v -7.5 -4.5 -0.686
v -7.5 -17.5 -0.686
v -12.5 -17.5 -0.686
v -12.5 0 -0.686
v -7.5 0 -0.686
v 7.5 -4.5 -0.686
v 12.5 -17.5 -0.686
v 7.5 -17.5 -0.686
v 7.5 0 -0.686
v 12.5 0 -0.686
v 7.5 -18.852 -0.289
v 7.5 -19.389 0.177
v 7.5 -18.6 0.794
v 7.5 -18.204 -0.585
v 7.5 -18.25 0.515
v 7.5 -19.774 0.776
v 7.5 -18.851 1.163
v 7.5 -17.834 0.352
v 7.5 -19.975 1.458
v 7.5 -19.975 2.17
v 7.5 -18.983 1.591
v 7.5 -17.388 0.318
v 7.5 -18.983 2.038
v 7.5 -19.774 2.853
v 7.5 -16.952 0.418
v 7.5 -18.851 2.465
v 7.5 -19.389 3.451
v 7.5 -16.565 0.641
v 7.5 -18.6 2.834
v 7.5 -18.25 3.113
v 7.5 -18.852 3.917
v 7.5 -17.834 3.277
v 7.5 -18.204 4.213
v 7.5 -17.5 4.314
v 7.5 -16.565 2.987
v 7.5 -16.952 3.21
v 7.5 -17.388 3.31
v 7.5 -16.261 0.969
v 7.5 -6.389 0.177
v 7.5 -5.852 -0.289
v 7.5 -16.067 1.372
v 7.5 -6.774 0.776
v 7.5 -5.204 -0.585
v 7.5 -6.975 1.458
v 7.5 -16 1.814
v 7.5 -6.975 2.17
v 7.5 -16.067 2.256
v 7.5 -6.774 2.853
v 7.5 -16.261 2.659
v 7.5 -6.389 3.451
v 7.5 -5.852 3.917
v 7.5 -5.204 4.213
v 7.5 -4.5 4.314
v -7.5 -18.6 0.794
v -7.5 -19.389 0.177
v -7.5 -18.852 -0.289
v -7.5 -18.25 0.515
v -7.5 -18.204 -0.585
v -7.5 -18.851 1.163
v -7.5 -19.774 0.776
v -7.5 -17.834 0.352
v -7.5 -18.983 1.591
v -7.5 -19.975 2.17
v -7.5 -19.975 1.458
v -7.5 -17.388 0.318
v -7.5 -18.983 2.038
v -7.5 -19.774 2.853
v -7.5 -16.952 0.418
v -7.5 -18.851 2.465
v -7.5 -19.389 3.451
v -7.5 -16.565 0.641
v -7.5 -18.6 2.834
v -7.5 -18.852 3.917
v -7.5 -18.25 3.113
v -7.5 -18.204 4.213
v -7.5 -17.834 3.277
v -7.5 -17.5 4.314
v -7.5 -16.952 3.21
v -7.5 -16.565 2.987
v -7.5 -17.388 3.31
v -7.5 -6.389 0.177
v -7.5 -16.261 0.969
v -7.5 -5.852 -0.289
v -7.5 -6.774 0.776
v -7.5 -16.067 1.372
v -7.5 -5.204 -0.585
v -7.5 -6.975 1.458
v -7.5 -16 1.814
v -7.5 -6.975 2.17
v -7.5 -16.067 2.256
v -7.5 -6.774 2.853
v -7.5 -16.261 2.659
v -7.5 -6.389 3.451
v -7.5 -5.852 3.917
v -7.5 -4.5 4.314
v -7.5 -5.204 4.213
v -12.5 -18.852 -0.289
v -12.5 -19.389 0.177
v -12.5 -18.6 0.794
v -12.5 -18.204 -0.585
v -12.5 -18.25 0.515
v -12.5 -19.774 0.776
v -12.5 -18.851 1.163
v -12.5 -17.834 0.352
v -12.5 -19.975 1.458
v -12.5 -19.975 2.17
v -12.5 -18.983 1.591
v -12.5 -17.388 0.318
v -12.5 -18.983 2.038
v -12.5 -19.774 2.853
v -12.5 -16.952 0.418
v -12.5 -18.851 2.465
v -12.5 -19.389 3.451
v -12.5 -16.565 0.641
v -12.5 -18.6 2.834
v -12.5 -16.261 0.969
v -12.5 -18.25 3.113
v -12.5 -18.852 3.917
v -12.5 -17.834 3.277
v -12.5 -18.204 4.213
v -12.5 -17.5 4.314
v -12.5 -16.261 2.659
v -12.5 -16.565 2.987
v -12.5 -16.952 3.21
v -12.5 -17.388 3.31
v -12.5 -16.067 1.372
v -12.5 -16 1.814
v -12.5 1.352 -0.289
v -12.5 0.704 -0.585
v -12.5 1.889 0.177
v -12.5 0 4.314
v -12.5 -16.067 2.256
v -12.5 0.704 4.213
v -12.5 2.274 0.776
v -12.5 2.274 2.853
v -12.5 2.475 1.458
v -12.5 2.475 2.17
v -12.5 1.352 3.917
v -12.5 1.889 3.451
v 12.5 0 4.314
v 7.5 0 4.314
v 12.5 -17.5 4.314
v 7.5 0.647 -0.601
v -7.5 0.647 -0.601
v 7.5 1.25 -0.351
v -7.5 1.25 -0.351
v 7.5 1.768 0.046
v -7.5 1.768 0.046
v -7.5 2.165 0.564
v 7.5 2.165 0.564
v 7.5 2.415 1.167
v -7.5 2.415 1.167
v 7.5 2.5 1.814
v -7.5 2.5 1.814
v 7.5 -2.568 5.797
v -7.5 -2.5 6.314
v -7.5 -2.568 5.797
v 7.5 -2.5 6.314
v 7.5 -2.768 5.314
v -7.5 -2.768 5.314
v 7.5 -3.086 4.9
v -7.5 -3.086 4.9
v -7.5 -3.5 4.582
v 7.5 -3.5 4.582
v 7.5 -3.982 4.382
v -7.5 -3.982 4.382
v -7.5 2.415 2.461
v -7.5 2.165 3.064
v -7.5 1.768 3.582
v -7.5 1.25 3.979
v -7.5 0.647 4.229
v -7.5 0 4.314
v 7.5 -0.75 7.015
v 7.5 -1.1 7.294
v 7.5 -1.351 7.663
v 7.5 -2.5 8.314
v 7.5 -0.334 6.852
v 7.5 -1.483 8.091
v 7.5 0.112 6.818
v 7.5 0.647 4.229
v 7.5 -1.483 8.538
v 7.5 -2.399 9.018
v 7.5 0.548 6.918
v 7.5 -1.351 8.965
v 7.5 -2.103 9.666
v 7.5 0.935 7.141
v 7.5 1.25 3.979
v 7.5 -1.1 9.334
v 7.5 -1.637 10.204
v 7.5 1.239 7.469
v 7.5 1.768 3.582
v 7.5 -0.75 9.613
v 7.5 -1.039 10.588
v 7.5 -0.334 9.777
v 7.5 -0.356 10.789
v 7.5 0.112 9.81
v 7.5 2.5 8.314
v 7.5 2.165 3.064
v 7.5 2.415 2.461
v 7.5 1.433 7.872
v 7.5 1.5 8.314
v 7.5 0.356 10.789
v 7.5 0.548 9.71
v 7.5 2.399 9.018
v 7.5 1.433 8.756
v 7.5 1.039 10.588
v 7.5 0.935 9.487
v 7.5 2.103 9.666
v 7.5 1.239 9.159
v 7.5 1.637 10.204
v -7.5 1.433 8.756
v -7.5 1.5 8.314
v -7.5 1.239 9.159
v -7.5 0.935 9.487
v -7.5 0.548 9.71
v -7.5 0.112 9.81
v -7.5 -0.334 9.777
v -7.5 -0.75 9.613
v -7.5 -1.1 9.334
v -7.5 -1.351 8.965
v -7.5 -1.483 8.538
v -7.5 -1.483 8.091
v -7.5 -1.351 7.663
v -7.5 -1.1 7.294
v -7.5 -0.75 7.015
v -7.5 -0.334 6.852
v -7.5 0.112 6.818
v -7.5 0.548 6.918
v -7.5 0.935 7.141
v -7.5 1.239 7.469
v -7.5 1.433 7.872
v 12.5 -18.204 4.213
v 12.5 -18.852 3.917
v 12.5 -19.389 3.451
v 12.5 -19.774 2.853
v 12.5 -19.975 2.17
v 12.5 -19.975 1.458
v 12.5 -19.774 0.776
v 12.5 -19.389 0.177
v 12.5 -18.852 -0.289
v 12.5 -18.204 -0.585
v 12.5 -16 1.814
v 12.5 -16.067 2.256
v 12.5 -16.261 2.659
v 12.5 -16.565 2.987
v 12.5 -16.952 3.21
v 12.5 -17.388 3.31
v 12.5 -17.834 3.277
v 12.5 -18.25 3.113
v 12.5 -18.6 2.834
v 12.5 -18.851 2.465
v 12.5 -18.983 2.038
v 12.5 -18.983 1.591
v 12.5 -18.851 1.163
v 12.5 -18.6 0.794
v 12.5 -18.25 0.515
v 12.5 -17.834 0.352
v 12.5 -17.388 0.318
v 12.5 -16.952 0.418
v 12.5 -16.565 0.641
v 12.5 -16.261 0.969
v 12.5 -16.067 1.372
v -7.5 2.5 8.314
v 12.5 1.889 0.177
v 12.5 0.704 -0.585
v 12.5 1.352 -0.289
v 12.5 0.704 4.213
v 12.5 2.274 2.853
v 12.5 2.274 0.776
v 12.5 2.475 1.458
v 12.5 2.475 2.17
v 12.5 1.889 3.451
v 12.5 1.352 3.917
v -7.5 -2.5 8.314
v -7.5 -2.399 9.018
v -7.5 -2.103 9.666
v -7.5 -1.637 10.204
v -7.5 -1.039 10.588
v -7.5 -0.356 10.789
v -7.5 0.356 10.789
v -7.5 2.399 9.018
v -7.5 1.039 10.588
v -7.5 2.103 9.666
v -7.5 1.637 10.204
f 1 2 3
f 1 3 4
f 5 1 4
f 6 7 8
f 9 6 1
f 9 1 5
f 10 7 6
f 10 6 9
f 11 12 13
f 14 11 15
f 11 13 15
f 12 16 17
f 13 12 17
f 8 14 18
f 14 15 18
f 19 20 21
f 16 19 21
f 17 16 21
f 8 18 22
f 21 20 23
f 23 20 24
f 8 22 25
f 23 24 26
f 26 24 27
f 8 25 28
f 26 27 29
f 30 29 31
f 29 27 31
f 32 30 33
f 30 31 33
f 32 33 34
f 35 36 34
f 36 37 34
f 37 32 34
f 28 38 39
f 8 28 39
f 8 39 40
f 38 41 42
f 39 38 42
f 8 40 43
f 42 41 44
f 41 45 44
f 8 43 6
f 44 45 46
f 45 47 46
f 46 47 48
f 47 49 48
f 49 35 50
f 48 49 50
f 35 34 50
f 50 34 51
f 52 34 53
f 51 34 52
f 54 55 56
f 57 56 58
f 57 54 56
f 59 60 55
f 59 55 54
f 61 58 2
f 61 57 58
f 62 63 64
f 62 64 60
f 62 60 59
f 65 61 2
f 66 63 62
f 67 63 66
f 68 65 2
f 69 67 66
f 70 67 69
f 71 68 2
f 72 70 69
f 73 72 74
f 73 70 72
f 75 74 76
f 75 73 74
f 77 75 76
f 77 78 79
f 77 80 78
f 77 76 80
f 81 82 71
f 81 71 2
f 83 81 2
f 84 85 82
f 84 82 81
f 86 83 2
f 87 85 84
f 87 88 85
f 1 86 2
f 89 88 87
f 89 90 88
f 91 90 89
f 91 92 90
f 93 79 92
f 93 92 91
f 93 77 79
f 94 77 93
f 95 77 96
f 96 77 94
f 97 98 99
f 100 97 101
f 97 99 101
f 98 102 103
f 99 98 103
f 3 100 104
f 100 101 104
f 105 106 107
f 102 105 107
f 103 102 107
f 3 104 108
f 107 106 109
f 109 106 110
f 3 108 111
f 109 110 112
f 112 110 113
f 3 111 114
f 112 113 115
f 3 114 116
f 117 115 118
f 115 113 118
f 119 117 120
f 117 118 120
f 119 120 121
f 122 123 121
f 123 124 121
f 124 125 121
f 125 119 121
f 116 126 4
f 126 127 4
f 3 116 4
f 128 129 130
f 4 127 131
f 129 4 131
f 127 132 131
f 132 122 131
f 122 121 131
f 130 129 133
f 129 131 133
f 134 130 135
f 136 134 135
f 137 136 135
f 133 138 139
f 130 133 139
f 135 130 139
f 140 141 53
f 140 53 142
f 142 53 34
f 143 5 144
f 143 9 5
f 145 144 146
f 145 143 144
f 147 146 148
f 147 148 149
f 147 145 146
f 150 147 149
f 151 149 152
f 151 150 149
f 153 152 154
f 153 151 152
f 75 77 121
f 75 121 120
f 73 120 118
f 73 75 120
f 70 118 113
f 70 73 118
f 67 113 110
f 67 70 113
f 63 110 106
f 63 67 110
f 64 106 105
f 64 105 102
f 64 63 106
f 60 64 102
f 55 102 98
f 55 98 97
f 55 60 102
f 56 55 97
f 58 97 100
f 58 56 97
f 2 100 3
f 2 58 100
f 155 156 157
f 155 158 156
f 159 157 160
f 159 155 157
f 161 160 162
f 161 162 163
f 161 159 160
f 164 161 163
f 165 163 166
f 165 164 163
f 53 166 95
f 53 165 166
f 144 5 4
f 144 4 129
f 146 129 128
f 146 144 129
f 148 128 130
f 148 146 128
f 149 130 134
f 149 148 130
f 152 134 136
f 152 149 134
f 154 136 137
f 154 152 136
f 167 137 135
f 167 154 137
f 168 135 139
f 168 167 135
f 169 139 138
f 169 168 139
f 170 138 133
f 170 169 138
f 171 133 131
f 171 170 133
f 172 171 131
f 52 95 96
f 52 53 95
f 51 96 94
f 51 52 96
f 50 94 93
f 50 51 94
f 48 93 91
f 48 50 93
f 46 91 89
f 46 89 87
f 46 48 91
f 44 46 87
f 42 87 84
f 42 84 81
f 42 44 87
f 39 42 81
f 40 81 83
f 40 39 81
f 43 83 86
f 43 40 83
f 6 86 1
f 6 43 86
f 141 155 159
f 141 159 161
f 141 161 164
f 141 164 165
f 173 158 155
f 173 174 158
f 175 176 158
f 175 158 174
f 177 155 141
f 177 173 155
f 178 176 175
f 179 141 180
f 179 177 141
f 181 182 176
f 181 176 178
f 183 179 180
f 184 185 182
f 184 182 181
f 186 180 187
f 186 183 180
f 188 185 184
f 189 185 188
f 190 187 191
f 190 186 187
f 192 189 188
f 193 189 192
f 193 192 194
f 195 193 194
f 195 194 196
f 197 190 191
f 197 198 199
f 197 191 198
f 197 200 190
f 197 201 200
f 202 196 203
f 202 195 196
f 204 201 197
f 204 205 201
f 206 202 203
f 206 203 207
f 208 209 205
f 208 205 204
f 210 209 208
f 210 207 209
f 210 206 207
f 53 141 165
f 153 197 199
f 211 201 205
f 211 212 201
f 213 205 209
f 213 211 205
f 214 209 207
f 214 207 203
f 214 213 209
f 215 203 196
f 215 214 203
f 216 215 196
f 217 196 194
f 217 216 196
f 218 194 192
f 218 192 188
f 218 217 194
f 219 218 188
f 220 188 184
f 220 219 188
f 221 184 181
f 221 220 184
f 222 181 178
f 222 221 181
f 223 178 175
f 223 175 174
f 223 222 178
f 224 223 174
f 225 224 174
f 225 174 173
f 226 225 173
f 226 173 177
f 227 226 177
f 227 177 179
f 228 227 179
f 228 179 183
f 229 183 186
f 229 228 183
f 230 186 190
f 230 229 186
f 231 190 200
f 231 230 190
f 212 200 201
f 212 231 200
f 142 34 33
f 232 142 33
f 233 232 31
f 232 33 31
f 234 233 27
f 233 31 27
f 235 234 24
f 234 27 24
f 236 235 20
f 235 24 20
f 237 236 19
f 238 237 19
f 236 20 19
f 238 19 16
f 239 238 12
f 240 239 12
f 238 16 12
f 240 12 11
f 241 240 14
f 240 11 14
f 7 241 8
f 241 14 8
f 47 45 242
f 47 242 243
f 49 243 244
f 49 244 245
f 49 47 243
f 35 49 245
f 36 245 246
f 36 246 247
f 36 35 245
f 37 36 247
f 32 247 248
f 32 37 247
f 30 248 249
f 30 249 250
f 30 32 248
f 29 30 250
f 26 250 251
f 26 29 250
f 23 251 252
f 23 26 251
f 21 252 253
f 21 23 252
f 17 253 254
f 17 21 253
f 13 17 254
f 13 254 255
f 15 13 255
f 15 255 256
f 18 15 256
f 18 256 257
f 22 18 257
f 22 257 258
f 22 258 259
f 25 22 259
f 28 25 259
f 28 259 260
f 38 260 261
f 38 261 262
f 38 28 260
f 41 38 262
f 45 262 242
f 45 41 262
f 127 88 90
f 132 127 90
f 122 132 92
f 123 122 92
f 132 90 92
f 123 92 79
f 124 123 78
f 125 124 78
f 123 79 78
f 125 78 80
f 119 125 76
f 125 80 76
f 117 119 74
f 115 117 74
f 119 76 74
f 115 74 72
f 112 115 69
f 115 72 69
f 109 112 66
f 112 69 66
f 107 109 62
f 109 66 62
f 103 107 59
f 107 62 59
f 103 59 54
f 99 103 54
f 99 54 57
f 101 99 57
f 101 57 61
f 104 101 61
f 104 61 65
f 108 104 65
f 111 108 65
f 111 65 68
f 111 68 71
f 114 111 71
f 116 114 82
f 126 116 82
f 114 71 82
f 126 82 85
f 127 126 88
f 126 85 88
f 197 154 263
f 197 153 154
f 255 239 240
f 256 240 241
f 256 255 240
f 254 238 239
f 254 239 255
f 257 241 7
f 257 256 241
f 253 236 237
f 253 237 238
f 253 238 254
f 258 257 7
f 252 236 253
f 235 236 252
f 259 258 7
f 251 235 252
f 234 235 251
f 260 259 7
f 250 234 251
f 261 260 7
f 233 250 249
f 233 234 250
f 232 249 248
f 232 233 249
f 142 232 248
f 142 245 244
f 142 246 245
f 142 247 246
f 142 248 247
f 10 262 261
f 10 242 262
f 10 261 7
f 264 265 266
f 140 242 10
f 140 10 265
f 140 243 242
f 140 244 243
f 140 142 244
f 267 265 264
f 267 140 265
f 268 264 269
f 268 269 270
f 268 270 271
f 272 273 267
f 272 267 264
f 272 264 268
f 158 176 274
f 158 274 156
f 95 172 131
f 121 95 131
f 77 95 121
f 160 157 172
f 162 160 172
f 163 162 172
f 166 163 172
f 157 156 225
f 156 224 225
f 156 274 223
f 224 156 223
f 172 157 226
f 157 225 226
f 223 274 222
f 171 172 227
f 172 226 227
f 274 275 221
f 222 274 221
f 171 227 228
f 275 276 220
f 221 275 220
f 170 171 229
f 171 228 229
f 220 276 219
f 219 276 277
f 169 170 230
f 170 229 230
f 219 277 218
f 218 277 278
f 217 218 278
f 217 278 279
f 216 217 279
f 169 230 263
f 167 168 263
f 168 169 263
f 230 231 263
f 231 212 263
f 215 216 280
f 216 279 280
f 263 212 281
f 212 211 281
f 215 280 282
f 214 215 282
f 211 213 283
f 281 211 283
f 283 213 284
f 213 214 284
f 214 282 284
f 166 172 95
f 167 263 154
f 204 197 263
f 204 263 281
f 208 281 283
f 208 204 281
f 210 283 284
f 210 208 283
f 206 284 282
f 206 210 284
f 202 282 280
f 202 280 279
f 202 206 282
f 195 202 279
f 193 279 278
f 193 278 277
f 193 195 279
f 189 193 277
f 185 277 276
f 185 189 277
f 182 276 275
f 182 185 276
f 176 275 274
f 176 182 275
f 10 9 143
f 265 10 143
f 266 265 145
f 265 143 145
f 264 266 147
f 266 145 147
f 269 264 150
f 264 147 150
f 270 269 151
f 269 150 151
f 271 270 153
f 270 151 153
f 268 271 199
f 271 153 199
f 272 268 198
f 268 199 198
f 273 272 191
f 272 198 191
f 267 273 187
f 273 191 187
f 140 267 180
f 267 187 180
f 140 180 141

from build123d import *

# Parameters (mm, degrees)
F0_R     = 1.5
F1_DEPTH = 7.5
F2_R     = 1.5
F3_DEPTH = 5
F4_R     = 2.4999


# Not quite as in the source:
# - a fillet or chamfer is up to 0.001 mm smaller than in the source, because OpenCascade refuses the exact size
# - a pattern or mirror of a feature is missing from the dataset's text; its kind, count and spacing are read off the source's solid


with BuildPart() as f1:
    # F0 (on Right) → F1 (new body, symmetric)
    with BuildSketch(Plane.YZ):
        with BuildLine():
            Line((-4.5, -0.685833849), (-2.5, -0.685833849))
            Line((-2.5, -0.685833849), (2.5, -0.685833849))
            Line((2.5, -0.685833849), (2.5, 8.314166151))
            ThreePointArc((2.5, 8.314166151), (0, 10.814166151), (-2.5, 8.314166151))
            Line((-2.5, 8.314166151), (-2.5, 6.314166151))
            ThreePointArc((-2.5, 6.314166151), (-3.0857864376, 4.8999525886), (-4.5, 4.314166151))
            ThreePointArc((-4.5, 4.314166151), (-7, 1.814166151), (-4.5, -0.685833849))
        make_face()
        with Locations((0, 8.314166151)):
            Circle(F0_R, mode=Mode.SUBTRACT)
    extrude(amount=F1_DEPTH, both=True)

    # F2 (on face) → F3 (join)
    with BuildSketch(Plane.YZ.offset(7.5)):
        with BuildLine():
            Line((-17.5, -0.685833849), (0, -0.685833849))
            ThreePointArc((0, -0.685833849), (2.5, 1.814166151), (0, 4.314166151))
            Line((0, 4.314166151), (-17.5, 4.314166151))
            ThreePointArc((-17.5, 4.314166151), (-20, 1.814166151), (-17.5, -0.685833849))
        make_face()
        with Locations((-17.5, 1.814166151)):
            Circle(F2_R, mode=Mode.SUBTRACT)
    f3 = extrude(amount=F3_DEPTH)

    # F3_copies: F3 across plane
    add(f3.mirror(Plane(origin=(0, 0, 0), x_dir=(0, 0, -1), z_dir=(-1, 0, 0))))

    # F4 (radius 2.5 in the source; OpenCascade refuses exactly that, so slightly less here)
    f4_edges = [f1.edges().sort_by_distance(p)[0] for p in [
        (0, 2.5, -0.685834),
    ]]
    fillet(f4_edges, radius=F4_R)


solid = f1.part
